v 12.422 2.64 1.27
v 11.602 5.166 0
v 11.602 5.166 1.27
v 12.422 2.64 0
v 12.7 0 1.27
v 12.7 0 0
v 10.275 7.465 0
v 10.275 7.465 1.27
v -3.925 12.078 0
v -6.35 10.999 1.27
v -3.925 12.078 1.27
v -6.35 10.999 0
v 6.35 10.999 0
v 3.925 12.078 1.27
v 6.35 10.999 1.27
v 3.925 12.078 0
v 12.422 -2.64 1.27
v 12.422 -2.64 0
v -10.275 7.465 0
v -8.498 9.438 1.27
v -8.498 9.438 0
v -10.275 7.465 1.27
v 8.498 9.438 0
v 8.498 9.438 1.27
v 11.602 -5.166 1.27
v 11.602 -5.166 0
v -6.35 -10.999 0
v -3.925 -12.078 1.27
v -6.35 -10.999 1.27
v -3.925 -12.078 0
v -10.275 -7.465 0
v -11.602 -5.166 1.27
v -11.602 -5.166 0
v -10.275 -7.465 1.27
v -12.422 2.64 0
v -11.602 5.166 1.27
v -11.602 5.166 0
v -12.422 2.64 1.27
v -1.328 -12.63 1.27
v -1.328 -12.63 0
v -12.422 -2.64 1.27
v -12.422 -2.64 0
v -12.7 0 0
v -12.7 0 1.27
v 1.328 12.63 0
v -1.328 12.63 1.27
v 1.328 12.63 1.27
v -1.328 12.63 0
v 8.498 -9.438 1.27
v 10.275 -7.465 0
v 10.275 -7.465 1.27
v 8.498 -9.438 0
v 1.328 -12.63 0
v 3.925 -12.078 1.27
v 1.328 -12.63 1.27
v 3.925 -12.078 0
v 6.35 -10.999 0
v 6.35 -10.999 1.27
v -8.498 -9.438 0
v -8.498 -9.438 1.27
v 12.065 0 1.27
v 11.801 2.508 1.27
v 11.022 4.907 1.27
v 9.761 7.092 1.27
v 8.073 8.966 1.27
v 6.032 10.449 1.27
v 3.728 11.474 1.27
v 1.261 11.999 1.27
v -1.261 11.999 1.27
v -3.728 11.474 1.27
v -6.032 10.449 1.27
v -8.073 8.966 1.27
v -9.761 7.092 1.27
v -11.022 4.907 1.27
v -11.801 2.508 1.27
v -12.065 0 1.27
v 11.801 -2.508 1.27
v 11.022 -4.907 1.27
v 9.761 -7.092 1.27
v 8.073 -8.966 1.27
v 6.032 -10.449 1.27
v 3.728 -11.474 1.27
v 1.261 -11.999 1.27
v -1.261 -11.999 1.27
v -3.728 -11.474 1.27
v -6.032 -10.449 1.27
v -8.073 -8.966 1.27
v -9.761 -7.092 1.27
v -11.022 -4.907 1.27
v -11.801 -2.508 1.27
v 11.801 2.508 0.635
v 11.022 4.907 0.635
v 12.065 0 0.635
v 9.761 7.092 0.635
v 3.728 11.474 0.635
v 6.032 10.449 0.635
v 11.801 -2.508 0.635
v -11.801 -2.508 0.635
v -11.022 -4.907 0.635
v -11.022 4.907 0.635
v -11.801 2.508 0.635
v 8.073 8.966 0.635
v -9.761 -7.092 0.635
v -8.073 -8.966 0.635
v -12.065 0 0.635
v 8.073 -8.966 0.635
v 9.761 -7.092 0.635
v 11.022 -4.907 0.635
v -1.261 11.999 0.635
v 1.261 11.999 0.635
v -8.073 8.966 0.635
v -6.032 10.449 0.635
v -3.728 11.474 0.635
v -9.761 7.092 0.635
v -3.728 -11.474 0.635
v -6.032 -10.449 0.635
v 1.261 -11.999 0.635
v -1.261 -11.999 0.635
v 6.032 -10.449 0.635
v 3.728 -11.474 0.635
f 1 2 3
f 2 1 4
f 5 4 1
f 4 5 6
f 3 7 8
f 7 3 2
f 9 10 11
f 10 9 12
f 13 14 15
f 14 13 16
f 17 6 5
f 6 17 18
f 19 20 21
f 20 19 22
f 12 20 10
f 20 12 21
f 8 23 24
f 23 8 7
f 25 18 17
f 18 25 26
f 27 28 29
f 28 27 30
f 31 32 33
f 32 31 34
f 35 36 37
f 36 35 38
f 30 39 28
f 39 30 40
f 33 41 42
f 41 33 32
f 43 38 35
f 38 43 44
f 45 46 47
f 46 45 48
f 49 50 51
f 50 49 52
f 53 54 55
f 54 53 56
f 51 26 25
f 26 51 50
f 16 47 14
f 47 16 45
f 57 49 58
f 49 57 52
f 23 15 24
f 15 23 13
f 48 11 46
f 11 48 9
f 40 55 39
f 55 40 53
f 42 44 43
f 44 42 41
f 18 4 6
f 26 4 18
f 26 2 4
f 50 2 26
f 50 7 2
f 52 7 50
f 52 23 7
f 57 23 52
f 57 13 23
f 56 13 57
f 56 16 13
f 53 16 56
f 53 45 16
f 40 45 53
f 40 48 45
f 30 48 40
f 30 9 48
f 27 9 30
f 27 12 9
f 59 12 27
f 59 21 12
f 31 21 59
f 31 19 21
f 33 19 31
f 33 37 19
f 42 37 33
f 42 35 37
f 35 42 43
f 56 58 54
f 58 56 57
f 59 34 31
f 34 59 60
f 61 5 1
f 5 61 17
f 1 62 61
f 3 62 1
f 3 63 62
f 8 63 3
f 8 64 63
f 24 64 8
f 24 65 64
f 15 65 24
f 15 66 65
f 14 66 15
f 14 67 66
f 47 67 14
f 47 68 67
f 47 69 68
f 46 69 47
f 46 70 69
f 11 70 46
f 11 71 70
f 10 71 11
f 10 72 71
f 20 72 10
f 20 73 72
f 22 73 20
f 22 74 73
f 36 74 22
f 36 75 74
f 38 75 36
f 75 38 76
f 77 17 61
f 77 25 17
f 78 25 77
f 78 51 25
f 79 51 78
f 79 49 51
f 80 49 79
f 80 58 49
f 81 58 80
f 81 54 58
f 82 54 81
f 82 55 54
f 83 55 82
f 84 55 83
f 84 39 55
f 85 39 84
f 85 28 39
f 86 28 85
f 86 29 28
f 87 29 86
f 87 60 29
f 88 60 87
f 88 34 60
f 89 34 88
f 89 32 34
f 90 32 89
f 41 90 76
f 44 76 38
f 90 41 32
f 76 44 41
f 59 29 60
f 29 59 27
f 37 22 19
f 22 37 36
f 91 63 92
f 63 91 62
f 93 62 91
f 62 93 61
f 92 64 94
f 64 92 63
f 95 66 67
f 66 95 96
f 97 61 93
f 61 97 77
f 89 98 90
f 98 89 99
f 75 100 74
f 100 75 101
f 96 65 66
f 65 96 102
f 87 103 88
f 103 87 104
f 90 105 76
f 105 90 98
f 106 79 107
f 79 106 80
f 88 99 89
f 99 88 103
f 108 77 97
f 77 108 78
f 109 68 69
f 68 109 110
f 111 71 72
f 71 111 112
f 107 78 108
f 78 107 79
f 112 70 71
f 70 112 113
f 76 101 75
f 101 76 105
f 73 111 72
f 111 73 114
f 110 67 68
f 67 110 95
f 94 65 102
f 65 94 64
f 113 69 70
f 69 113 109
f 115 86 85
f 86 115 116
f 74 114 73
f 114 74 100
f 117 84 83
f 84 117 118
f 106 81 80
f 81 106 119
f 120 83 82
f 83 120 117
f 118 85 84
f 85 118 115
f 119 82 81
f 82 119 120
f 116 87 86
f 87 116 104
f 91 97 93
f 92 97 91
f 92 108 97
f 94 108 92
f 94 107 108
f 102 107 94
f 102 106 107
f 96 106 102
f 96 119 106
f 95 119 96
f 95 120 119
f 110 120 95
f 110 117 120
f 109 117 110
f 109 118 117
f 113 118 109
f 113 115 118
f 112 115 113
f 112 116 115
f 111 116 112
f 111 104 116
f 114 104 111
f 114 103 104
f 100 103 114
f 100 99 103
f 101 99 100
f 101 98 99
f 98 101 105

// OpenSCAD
// OSHW Logo Generator

// render_part=1; // gear_tooth_2d()
// render_part=2; // oshw_logo_2d()
render_part=3; // 4mm shelled oshw_logo_2d()
render_part=4; // 1 inch OSHW Coin

module gear_tooth_2d(scale=1.0) {
  scale([scale,scale]) projection(cute=true) rotate([0,90,0])
    cylinder(r1=25.0,r2=24.0/2,h=90.0,center=false);
}

if(render_part==1) {
  echo("Rendering gear_tooth_2d()...");
  gear_tooth_2d();
}

module oshw_logo_2d(scale=1.0) {
  scale([scale,scale]) rotate(-45-90) {
    difference() {
      union() {
	  circle(r=70.0);
	  for(i=[1:7]) assign(rotAngle=360*i/8+45) rotate(rotAngle) {
	    gear_tooth_2d();
	  }
	}
	circle(r=25.0);
	intersection() {
	  rotate(-20) square(size=[100,100]);
	  rotate(20)  square(size=[100,100]);
	}
    }
  }
}

if(render_part==2) {
  echo("Rendering gear_tooth_2d()...");
  oshw_logo_2d();
}

module shell_2d(width=2.0,steps=8,scale_x=1.0,scale_y=1.0) {
  union() {
    for(i=[0:steps-1]) assign(rotAngle=360*i/steps) difference() {
      child(0);
      translate([scale_x*width*cos(rotAngle),scale_y*width*sin(rotAngle)]) 
	  child(0);
    }
  }
}

if(render_part==3) {
  // Note: Don't perform shell operation on gear_tooth_2d() directly. It's rather inefficient.
  echo("Rendering 4mm shelled gear_tooth_2d()...");
  shell_2d(width=4.0,steps=16,scale_x=1.0,scale_y=1.0)
    import_dxf(file="static_files/oshw_logo_2d.dxf");
}

module oshw_coin(scale=0.1, coin_h=10.0, coin_wall_th=5.0, extension=0.1) {
  scale([scale,scale,scale]) union() {
    difference() {
	cylinder(r=100.0,h=coin_h,center=false);
	translate([0,0,coin_wall_th])
	  cylinder(r=100.0-coin_wall_th,h=coin_h-coin_wall_th+extension,center=false);
	translate([0,0,-extension])
	  linear_extrude(file="static_files/oshw_logo_2d.shell_4mm.dxf",height=coin_wall_th/2+extension,center=false);
    }
    translate([0,0,coin_wall_th]) color([0,0,1.0])
	linear_extrude(file="static_files/oshw_logo_2d.dxf",height=coin_wall_th/2,center=false);
    translate([0,0,coin_wall_th-extension]) color([0,0,0])
	linear_extrude(file="static_files/oshw_logo_2d.shell_4mm.dxf",height=coin_wall_th+extension,center=false);
  }
}

if(render_part==4) {
  echo("Rendering OSHW Coin scaled to 25.4mm, aka 1 inch...");
  echo("  Note: Colours aren't preserved in the final STL output.");
  oshw_coin(scale=0.254/2);
}


    
